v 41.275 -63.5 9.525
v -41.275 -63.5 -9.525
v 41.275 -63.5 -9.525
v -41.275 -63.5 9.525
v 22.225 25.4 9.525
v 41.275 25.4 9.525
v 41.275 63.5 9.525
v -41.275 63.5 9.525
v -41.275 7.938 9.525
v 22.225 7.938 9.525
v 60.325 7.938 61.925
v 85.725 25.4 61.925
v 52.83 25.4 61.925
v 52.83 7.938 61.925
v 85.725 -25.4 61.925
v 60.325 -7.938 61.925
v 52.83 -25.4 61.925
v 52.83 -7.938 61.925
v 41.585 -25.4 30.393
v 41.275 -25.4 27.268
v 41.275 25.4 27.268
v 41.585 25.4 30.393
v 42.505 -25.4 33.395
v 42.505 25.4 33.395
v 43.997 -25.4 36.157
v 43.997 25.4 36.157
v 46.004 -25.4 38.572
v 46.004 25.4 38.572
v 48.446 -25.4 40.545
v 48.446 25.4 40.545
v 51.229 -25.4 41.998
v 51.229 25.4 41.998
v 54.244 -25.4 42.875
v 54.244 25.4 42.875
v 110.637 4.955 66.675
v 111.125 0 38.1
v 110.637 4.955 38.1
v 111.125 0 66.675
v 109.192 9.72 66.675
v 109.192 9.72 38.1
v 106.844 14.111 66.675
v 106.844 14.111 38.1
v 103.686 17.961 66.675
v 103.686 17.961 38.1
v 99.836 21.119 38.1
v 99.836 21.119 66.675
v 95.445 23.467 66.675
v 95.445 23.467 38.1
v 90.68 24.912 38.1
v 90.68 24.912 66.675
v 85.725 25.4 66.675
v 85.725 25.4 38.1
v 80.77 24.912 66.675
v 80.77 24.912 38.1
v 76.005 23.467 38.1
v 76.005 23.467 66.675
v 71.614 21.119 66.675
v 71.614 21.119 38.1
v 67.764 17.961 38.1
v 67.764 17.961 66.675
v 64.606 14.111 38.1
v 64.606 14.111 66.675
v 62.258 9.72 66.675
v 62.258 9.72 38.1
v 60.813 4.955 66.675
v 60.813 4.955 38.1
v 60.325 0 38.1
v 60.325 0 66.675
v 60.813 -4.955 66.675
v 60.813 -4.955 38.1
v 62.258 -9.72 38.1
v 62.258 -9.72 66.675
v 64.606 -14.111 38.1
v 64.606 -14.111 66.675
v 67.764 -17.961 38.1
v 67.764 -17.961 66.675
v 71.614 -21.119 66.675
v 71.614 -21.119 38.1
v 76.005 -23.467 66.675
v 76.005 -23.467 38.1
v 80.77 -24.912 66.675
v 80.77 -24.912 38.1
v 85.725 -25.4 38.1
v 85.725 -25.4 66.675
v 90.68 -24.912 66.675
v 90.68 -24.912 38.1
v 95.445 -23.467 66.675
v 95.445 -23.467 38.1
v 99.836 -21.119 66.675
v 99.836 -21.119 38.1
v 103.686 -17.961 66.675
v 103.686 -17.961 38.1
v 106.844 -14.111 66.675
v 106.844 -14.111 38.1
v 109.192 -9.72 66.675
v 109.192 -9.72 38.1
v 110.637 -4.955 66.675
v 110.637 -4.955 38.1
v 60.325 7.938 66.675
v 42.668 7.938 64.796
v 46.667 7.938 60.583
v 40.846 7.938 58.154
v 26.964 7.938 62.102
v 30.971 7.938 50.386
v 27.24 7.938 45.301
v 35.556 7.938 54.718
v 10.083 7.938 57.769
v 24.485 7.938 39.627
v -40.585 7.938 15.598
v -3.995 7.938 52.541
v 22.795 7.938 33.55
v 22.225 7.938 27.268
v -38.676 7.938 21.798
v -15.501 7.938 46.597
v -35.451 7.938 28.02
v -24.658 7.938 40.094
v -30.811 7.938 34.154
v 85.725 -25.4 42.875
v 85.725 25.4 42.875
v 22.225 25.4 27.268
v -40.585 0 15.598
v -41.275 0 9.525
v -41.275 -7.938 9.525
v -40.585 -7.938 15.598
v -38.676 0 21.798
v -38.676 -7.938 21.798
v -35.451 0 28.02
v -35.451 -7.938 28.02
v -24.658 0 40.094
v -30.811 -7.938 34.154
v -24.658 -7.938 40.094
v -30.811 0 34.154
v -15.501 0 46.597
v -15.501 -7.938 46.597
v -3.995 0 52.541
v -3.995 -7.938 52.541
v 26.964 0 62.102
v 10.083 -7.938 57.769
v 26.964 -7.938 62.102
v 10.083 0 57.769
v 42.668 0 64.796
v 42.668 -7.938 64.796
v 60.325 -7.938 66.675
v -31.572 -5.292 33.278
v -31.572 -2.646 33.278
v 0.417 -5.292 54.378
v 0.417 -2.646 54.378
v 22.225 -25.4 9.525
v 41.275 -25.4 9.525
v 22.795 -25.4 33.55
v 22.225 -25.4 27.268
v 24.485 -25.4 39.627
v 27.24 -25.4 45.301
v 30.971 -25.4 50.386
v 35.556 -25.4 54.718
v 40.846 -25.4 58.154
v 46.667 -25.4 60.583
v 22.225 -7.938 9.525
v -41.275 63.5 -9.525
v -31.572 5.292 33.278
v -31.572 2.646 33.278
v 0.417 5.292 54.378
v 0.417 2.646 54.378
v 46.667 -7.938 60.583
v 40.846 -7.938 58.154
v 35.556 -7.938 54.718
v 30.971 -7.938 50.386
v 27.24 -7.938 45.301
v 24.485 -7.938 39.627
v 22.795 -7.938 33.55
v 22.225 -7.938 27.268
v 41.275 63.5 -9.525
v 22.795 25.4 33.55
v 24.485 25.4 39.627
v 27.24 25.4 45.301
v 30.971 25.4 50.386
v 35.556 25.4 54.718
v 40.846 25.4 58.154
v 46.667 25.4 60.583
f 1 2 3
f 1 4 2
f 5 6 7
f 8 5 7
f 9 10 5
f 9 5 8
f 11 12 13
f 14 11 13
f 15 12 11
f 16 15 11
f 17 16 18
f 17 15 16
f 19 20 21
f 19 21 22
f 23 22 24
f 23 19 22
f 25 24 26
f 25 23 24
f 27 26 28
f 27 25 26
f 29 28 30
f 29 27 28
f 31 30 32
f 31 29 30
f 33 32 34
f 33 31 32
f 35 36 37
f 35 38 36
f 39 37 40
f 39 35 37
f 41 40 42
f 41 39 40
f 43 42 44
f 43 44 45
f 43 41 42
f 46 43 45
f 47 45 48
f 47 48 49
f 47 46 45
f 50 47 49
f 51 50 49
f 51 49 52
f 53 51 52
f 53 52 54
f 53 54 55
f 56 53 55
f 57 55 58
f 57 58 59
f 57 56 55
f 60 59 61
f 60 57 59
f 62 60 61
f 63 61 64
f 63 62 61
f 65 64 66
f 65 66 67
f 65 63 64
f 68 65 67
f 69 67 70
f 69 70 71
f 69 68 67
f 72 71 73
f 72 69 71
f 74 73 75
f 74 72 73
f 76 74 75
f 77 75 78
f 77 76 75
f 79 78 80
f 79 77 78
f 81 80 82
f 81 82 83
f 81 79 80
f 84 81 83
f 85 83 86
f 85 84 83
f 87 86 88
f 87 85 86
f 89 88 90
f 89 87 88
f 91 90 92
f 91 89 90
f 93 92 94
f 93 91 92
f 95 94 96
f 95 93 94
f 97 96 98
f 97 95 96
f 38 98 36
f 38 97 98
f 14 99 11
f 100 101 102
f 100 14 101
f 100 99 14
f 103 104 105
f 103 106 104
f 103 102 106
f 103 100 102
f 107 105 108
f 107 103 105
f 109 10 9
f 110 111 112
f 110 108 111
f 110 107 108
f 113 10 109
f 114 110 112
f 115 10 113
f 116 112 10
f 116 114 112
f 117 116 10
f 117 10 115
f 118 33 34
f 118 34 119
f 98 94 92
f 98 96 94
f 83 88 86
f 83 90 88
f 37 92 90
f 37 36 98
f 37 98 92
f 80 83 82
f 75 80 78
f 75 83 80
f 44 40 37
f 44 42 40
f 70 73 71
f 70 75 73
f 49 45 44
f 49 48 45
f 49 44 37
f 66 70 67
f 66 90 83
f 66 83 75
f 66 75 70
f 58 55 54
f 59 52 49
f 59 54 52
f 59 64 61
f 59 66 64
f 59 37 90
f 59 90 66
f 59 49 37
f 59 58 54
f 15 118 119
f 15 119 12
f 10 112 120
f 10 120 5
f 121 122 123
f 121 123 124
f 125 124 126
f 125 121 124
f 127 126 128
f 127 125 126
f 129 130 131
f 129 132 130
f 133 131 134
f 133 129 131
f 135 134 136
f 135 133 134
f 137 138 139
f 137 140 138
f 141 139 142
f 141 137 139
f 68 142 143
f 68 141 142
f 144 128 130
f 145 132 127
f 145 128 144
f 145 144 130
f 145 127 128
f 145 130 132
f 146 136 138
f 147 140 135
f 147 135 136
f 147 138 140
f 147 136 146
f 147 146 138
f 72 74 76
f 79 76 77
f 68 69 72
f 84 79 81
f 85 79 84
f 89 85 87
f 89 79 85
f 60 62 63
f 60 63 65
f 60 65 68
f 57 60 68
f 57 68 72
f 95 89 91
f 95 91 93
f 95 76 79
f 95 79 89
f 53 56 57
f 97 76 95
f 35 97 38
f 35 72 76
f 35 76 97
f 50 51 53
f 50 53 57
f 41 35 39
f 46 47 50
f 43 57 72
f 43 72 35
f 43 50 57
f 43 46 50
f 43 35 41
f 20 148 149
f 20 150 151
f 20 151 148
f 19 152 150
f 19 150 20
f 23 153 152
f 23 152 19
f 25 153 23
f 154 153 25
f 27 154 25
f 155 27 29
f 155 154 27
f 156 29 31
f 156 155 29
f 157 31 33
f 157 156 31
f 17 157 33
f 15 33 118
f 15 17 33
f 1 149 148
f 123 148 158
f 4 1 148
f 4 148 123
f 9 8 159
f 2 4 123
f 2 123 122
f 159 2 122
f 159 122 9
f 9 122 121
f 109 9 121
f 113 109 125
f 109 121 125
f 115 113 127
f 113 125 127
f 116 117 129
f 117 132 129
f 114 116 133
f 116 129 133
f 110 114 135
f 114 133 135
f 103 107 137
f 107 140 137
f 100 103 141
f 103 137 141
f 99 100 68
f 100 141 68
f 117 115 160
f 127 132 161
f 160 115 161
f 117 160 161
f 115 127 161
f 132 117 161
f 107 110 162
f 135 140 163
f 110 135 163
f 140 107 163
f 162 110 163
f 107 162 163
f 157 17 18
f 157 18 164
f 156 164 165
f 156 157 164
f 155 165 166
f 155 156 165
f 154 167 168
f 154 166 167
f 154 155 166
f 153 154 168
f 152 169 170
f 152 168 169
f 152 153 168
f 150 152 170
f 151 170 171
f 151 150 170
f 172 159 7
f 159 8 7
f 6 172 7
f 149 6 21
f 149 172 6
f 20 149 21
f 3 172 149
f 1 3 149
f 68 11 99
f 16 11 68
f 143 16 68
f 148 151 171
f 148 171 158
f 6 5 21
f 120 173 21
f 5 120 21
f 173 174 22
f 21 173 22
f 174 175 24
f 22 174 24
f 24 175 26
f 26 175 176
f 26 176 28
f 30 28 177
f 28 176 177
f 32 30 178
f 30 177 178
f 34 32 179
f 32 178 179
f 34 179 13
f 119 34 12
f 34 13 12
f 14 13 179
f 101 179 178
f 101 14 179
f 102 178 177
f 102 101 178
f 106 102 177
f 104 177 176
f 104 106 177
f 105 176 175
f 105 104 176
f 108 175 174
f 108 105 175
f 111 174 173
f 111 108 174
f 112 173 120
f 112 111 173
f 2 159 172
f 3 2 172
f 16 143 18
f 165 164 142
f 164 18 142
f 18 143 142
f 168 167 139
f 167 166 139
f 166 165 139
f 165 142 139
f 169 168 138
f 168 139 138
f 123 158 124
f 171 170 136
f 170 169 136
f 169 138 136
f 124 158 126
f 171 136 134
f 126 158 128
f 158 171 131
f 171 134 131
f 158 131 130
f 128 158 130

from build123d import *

# Parameters (mm, degrees)
F1_DEPTH = 63.5
F0_W     = 25.4
F0_H     = 19.05
F2_DEPTH = 25.4
F3_DEPTH = 7.9375


with BuildPart() as f1:
    # F0 (on Front) → F1 (new body, symmetric)
    with BuildSketch(Plane.XZ):
        Polygon((-41.275, -9.525), (41.275, -9.525), (41.275, 9.525), (22.225, 9.525), (-41.275, 9.525), align=None)
    extrude(amount=F1_DEPTH, both=True)

    # F0 (on Front) → F2 (join, symmetric)
    with BuildSketch(Plane.XZ):
        with BuildLine():
            Line((22.225, 9.525), (41.275, 9.525))
            Line((41.275, 9.525), (41.275, 27.268456991))
            ThreePointArc((41.275, 27.268456991), (44.9403856979, 37.4144386387), (54.2439377757, 42.8752))
            Line((54.2439377757, 42.8752), (60.325, 42.8752))
            Line((60.325, 42.8752), (60.325, 61.9252))
            Line((60.325, 61.9252), (52.8296077714, 61.9252))
            ThreePointArc((52.8296077714, 61.9252), (30.9713319324, 50.3862631847), (22.225, 27.268456991))
            Line((22.225, 27.268456991), (22.225, 9.525))
        make_face()
        with Locations((73.025, 52.4002)):
            Rectangle(F0_W, F0_H)
    extrude(amount=F2_DEPTH, both=True)

    # F0 (on Front) → F3 (join, symmetric)
    with BuildSketch(Plane.XZ):
        with BuildLine():
            add(Edge.make_bspline(
                [(-41.275, 9.525), (-40.8368930221, 32.5554832816), (-15.4209258035, 60.8283095062), (60.325, 66.675)],
                knots=[0, 0, 0, 0, 116.5705044169, 116.5705044169, 116.5705044169, 116.5705044169], degree=3))
            Line((-41.275, 9.525), (22.225, 9.525))
            Line((22.225, 9.525), (22.225, 27.268456991))
            ThreePointArc((22.225, 27.268456991), (30.9713319324, 50.3862631847), (52.8296077714, 61.9252))
            Line((52.8296077714, 61.9252), (60.325, 61.9252))
            Line((60.325, 61.9252), (60.325, 66.675))
        make_face()
    extrude(amount=F3_DEPTH, both=True)


with BuildPart() as f4:
    # F0 (on Front) → F4 (revolve)
    with BuildSketch(Plane.XZ):
        Polygon((111.125, 66.675), (85.725, 66.675), (85.725, 61.9252), (85.725, 42.8752), (85.725, 38.1), (111.125, 38.1), align=None)
    revolve(axis=Axis((85.725, 0, 52.3875), (0, 0, 1)))


solid = Compound([f1.part, f4.part])
